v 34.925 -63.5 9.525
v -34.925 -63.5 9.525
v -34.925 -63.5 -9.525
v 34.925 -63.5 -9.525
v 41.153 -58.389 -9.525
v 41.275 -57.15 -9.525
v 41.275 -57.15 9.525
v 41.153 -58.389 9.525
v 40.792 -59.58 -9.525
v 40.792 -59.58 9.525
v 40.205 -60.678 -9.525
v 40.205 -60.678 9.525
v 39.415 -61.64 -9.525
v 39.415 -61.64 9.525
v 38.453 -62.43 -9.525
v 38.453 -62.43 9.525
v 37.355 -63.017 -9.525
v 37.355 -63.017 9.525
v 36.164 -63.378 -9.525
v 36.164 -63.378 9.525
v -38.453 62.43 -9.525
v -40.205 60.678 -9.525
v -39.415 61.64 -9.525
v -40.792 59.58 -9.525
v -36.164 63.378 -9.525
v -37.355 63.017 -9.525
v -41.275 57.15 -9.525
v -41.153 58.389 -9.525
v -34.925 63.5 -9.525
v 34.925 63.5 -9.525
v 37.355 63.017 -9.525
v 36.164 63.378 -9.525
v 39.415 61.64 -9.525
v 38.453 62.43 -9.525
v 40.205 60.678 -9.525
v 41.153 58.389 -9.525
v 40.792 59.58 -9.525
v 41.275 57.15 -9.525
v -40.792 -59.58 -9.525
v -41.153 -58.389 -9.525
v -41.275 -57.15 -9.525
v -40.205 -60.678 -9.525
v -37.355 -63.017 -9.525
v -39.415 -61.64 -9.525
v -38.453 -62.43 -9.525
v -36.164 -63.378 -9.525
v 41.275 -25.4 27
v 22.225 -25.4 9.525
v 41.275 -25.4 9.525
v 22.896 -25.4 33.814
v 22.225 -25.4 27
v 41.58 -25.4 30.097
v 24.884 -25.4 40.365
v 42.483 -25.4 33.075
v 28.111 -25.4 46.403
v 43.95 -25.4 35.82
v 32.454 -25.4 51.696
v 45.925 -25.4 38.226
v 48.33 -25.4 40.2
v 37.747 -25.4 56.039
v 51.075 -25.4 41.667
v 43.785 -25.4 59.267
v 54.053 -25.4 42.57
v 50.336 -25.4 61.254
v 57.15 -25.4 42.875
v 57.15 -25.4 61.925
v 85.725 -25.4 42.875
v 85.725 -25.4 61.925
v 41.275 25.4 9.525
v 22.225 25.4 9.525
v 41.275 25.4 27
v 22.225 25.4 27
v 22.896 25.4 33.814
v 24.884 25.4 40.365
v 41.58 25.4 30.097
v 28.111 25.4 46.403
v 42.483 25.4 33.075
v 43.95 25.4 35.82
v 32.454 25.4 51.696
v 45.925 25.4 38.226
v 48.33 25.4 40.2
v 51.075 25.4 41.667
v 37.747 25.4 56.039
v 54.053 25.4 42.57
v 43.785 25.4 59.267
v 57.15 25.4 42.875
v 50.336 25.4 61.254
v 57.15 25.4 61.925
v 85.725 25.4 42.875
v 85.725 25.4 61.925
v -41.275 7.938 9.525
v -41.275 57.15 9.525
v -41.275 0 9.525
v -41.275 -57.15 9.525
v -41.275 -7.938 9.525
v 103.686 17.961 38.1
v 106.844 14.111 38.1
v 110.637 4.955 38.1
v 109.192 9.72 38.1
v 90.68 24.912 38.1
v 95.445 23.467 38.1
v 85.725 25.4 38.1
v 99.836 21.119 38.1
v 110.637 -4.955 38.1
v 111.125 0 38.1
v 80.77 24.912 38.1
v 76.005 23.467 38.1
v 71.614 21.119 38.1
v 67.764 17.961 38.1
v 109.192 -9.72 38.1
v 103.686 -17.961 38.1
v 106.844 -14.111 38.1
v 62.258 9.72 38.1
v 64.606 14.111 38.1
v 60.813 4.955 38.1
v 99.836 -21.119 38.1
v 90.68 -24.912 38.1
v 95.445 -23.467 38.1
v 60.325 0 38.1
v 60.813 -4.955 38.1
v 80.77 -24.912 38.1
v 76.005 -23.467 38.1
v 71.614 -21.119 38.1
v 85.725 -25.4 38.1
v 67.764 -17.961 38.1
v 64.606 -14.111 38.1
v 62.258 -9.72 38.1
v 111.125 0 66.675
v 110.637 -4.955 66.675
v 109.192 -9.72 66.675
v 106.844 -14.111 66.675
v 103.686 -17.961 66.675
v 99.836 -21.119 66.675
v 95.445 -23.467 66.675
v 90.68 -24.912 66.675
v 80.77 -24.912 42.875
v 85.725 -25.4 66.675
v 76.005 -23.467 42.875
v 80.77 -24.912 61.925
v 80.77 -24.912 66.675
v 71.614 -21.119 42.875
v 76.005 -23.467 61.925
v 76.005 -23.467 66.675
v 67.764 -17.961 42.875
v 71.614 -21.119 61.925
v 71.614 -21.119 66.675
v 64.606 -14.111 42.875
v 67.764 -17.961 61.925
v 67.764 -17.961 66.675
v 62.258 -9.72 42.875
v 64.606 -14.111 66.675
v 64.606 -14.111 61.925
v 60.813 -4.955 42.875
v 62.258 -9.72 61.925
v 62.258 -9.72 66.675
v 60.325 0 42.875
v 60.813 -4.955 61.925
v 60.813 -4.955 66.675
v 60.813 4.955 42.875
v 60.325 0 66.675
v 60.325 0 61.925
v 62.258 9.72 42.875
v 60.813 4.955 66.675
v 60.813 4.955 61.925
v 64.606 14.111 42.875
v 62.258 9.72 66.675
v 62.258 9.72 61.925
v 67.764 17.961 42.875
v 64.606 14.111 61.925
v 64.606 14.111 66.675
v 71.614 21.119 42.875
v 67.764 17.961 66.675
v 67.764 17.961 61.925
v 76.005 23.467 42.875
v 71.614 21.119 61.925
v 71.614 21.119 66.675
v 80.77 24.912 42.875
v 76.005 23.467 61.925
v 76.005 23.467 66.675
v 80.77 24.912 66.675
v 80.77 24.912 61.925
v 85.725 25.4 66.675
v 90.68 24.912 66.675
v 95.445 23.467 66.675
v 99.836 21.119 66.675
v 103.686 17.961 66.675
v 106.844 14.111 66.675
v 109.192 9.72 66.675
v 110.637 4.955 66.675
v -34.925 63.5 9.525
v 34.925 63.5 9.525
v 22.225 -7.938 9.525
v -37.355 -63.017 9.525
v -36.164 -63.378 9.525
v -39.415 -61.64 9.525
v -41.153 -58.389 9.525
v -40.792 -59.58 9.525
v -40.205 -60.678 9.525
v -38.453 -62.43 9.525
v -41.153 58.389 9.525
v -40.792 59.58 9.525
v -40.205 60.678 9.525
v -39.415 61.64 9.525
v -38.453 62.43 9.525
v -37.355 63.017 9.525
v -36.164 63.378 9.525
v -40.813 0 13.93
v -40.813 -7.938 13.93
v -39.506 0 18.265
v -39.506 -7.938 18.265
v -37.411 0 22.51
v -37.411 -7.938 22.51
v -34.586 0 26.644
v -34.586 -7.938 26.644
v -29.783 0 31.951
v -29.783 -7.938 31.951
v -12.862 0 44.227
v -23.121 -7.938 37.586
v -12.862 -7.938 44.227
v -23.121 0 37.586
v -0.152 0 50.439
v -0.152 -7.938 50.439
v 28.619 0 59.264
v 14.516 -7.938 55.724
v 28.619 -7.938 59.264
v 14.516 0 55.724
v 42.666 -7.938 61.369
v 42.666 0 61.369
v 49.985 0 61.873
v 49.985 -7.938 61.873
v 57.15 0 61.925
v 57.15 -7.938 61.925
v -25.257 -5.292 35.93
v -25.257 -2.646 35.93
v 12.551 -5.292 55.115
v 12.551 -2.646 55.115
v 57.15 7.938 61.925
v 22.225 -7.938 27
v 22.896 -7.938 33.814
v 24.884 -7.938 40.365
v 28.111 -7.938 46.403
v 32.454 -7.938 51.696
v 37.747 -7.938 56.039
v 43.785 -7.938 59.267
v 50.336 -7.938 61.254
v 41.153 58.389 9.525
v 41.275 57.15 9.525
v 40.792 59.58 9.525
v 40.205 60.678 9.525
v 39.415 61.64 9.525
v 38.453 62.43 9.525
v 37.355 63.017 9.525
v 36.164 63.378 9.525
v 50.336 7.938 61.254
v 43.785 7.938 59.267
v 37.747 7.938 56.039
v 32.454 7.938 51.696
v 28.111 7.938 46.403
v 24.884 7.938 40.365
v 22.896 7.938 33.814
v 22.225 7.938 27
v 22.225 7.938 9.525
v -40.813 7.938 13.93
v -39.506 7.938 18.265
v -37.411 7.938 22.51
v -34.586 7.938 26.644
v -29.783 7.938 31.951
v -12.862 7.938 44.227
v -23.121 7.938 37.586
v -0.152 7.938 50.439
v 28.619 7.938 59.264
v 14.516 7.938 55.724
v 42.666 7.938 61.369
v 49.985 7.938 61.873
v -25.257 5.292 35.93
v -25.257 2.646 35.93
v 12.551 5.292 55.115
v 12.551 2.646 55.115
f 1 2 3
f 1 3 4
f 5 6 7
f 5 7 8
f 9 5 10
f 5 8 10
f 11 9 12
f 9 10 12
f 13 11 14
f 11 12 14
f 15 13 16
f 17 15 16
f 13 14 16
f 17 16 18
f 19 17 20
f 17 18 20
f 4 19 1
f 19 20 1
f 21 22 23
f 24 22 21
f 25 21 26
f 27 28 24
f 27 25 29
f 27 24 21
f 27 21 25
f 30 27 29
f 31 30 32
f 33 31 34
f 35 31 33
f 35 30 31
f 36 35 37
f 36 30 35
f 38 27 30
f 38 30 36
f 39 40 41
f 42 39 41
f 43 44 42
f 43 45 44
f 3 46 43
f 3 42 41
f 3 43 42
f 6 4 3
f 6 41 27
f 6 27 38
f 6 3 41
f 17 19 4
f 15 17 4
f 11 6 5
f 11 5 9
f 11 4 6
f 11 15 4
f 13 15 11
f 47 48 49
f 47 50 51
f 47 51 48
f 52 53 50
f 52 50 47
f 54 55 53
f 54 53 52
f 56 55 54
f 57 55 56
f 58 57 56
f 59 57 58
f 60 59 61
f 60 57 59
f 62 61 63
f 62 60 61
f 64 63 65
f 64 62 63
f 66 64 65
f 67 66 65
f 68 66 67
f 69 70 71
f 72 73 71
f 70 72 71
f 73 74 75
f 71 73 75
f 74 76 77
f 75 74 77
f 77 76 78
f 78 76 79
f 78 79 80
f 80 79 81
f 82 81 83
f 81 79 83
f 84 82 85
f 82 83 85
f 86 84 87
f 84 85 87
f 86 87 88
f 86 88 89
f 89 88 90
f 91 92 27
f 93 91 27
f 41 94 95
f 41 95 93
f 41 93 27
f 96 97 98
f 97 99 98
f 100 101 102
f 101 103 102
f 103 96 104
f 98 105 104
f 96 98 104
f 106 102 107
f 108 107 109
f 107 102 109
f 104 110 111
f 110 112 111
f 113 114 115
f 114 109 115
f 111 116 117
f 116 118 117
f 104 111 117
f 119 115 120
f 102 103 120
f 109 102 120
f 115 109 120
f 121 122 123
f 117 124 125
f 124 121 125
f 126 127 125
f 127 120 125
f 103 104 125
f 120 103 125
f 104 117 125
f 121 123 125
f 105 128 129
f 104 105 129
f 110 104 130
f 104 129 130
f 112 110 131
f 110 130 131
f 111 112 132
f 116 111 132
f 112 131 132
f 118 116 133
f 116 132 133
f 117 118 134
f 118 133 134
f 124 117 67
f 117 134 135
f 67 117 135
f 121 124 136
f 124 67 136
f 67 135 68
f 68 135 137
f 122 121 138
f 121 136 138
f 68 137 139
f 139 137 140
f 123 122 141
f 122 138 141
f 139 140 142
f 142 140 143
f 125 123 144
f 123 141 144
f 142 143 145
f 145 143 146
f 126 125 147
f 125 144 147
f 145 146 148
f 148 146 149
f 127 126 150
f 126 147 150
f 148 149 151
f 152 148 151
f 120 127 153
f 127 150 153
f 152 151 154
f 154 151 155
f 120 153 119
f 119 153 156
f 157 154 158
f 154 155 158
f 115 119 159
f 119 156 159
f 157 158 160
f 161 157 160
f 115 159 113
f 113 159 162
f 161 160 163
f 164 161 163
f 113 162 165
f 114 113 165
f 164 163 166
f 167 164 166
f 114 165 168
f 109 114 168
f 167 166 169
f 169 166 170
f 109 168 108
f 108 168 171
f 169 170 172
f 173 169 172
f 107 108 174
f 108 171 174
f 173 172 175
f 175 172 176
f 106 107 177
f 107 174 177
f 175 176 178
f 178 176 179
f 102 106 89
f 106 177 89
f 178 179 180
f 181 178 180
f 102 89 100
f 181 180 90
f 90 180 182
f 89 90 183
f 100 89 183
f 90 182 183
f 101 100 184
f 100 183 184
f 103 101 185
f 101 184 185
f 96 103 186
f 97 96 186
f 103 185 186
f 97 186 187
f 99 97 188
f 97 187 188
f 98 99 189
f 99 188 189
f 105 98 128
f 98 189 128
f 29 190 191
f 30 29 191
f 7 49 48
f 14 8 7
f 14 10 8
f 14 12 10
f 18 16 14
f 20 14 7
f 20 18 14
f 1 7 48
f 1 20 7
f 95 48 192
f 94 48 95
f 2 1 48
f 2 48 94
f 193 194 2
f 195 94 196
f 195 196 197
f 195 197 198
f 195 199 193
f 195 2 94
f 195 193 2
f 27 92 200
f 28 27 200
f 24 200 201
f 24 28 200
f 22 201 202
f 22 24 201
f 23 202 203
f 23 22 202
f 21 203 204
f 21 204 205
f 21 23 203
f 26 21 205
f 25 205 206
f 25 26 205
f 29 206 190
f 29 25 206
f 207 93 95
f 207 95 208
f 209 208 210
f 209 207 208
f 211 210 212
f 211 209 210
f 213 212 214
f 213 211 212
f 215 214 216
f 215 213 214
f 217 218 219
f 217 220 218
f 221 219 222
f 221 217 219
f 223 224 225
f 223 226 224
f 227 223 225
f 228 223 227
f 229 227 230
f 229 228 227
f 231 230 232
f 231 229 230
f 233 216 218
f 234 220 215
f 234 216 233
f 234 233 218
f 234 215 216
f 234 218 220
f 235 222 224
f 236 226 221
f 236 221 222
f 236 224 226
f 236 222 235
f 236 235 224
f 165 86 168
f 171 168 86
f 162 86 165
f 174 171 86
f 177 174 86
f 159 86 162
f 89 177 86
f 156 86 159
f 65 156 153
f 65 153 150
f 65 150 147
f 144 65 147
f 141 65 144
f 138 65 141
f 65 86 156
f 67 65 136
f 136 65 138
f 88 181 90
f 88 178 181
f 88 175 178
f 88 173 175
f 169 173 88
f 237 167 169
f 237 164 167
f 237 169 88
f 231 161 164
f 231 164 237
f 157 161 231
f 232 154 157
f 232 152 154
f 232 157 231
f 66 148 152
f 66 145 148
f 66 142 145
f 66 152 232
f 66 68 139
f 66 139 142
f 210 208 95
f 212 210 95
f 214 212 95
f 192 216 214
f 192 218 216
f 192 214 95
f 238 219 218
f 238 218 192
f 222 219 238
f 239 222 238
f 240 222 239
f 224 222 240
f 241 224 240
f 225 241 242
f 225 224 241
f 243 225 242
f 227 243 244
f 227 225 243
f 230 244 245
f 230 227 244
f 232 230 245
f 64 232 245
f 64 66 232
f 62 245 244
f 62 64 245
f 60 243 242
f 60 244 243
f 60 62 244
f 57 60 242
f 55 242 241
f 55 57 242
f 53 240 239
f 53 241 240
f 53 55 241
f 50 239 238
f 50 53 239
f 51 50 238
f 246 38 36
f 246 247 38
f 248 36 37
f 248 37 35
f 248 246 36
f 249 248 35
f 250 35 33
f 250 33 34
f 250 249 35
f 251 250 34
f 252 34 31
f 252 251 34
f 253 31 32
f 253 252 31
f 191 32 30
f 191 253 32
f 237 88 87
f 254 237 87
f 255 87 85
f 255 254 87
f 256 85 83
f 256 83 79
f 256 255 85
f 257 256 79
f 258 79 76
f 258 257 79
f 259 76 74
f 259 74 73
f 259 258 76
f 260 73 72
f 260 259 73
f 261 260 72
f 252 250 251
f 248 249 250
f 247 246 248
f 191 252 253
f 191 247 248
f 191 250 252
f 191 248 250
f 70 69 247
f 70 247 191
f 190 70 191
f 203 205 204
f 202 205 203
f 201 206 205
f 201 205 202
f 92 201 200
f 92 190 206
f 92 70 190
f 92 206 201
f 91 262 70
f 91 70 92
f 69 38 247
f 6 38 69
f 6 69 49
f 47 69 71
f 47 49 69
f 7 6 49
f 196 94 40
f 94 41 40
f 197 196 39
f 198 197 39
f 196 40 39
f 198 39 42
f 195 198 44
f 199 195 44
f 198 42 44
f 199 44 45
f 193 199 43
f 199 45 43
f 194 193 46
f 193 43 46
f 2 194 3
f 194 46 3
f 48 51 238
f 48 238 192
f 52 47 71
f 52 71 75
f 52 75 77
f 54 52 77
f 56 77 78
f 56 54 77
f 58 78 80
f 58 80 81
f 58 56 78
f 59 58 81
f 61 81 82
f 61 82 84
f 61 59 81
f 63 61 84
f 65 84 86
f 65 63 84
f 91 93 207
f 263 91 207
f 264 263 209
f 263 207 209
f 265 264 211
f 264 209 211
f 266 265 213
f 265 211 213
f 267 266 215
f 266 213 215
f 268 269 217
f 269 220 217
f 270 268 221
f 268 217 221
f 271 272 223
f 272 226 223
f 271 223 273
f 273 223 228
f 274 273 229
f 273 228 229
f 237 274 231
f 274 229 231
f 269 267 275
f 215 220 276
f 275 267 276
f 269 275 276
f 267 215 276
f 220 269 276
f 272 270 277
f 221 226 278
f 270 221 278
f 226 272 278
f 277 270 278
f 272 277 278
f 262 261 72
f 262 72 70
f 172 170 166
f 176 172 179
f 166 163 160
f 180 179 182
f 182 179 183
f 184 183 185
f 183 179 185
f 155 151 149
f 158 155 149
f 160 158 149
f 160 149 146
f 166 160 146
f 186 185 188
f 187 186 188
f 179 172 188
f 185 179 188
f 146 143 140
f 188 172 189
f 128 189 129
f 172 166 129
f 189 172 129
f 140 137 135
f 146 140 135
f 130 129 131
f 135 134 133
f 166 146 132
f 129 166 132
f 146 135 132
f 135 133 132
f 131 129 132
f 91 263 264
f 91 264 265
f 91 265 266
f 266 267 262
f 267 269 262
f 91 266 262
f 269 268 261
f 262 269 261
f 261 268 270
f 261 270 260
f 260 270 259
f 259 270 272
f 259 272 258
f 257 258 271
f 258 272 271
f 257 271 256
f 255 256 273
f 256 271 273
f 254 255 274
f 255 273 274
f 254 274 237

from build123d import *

# Parameters (mm, degrees)
F1_DEPTH = 63.5
F2_DEPTH = 7.9375
F0_W     = 25.4
F0_H     = 19.05
F3_DEPTH = 25.4
F5_R     = 6.35


with BuildPart() as f1:
    # F0 (on Front) → F1 (new body, symmetric)
    with BuildSketch(Plane.XZ):
        Polygon((41.275, -9.525), (41.275, 9.525), (22.225, 9.525), (-41.275, 9.525), (-41.275, -9.525), align=None)
    extrude(amount=F1_DEPTH, both=True)

    # F0 (on Front) → F2 (join, symmetric)
    with BuildSketch(Plane.XZ):
        with BuildLine():
            Line((-41.275, 9.525), (22.225, 9.525))
            Line((22.225, 9.525), (22.225, 27.0002))
            ThreePointArc((22.225, 27.0002), (32.4542956671, 51.6959043329), (57.15, 61.9252))
            add(Edge.make_bspline(
                [(-41.275, 9.525), (-41.1499068141, 37.8207266331), (14.1535438597, 63.0222931504), (57.15, 61.9252)],
                knots=[0, 0, 0, 0, 111.5045361635, 111.5045361635, 111.5045361635, 111.5045361635], degree=3))
        make_face()
    extrude(amount=F2_DEPTH, both=True)

    # F0 (on Front) → F3 (join, symmetric)
    with BuildSketch(Plane.XZ):
        with BuildLine():
            Line((22.225, 9.525), (41.275, 9.525))
            Line((41.275, 9.525), (41.275, 27.0002))
            ThreePointArc((41.275, 27.0002), (45.9246798487, 38.2255201513), (57.15, 42.8752))
            Line((57.15, 42.8752), (60.325, 42.8752))
            Line((60.325, 42.8752), (60.325, 61.9252))
            Line((60.325, 61.9252), (57.15, 61.9252))
            ThreePointArc((57.15, 61.9252), (32.4542956671, 51.6959043329), (22.225, 27.0002))
            Line((22.225, 27.0002), (22.225, 9.525))
        make_face()
        with Locations((73.025, 52.4002)):
            Rectangle(F0_W, F0_H)
    extrude(amount=F3_DEPTH, both=True)

    # F0 (on Front) → F4 (revolve)
    with BuildSketch(Plane.XZ):
        Polygon((85.725, 61.9252), (85.725, 42.8752), (85.725, 38.1), (111.125, 38.1), (111.125, 66.675), (85.725, 66.675), align=None)
    revolve(axis=Axis((85.725, 0, 52.3875), (0, 0, -1)))

    # F5
    f5_edges = [f1.edges().sort_by_distance(p)[0] for p in [
        (-41.275, -63.5, 0),
        (41.275, -63.5, 0),
        (-41.275, 63.5, 0),
        (41.275, 63.5, 0),
    ]]
    fillet(f5_edges, radius=F5_R)


solid = f1.part
